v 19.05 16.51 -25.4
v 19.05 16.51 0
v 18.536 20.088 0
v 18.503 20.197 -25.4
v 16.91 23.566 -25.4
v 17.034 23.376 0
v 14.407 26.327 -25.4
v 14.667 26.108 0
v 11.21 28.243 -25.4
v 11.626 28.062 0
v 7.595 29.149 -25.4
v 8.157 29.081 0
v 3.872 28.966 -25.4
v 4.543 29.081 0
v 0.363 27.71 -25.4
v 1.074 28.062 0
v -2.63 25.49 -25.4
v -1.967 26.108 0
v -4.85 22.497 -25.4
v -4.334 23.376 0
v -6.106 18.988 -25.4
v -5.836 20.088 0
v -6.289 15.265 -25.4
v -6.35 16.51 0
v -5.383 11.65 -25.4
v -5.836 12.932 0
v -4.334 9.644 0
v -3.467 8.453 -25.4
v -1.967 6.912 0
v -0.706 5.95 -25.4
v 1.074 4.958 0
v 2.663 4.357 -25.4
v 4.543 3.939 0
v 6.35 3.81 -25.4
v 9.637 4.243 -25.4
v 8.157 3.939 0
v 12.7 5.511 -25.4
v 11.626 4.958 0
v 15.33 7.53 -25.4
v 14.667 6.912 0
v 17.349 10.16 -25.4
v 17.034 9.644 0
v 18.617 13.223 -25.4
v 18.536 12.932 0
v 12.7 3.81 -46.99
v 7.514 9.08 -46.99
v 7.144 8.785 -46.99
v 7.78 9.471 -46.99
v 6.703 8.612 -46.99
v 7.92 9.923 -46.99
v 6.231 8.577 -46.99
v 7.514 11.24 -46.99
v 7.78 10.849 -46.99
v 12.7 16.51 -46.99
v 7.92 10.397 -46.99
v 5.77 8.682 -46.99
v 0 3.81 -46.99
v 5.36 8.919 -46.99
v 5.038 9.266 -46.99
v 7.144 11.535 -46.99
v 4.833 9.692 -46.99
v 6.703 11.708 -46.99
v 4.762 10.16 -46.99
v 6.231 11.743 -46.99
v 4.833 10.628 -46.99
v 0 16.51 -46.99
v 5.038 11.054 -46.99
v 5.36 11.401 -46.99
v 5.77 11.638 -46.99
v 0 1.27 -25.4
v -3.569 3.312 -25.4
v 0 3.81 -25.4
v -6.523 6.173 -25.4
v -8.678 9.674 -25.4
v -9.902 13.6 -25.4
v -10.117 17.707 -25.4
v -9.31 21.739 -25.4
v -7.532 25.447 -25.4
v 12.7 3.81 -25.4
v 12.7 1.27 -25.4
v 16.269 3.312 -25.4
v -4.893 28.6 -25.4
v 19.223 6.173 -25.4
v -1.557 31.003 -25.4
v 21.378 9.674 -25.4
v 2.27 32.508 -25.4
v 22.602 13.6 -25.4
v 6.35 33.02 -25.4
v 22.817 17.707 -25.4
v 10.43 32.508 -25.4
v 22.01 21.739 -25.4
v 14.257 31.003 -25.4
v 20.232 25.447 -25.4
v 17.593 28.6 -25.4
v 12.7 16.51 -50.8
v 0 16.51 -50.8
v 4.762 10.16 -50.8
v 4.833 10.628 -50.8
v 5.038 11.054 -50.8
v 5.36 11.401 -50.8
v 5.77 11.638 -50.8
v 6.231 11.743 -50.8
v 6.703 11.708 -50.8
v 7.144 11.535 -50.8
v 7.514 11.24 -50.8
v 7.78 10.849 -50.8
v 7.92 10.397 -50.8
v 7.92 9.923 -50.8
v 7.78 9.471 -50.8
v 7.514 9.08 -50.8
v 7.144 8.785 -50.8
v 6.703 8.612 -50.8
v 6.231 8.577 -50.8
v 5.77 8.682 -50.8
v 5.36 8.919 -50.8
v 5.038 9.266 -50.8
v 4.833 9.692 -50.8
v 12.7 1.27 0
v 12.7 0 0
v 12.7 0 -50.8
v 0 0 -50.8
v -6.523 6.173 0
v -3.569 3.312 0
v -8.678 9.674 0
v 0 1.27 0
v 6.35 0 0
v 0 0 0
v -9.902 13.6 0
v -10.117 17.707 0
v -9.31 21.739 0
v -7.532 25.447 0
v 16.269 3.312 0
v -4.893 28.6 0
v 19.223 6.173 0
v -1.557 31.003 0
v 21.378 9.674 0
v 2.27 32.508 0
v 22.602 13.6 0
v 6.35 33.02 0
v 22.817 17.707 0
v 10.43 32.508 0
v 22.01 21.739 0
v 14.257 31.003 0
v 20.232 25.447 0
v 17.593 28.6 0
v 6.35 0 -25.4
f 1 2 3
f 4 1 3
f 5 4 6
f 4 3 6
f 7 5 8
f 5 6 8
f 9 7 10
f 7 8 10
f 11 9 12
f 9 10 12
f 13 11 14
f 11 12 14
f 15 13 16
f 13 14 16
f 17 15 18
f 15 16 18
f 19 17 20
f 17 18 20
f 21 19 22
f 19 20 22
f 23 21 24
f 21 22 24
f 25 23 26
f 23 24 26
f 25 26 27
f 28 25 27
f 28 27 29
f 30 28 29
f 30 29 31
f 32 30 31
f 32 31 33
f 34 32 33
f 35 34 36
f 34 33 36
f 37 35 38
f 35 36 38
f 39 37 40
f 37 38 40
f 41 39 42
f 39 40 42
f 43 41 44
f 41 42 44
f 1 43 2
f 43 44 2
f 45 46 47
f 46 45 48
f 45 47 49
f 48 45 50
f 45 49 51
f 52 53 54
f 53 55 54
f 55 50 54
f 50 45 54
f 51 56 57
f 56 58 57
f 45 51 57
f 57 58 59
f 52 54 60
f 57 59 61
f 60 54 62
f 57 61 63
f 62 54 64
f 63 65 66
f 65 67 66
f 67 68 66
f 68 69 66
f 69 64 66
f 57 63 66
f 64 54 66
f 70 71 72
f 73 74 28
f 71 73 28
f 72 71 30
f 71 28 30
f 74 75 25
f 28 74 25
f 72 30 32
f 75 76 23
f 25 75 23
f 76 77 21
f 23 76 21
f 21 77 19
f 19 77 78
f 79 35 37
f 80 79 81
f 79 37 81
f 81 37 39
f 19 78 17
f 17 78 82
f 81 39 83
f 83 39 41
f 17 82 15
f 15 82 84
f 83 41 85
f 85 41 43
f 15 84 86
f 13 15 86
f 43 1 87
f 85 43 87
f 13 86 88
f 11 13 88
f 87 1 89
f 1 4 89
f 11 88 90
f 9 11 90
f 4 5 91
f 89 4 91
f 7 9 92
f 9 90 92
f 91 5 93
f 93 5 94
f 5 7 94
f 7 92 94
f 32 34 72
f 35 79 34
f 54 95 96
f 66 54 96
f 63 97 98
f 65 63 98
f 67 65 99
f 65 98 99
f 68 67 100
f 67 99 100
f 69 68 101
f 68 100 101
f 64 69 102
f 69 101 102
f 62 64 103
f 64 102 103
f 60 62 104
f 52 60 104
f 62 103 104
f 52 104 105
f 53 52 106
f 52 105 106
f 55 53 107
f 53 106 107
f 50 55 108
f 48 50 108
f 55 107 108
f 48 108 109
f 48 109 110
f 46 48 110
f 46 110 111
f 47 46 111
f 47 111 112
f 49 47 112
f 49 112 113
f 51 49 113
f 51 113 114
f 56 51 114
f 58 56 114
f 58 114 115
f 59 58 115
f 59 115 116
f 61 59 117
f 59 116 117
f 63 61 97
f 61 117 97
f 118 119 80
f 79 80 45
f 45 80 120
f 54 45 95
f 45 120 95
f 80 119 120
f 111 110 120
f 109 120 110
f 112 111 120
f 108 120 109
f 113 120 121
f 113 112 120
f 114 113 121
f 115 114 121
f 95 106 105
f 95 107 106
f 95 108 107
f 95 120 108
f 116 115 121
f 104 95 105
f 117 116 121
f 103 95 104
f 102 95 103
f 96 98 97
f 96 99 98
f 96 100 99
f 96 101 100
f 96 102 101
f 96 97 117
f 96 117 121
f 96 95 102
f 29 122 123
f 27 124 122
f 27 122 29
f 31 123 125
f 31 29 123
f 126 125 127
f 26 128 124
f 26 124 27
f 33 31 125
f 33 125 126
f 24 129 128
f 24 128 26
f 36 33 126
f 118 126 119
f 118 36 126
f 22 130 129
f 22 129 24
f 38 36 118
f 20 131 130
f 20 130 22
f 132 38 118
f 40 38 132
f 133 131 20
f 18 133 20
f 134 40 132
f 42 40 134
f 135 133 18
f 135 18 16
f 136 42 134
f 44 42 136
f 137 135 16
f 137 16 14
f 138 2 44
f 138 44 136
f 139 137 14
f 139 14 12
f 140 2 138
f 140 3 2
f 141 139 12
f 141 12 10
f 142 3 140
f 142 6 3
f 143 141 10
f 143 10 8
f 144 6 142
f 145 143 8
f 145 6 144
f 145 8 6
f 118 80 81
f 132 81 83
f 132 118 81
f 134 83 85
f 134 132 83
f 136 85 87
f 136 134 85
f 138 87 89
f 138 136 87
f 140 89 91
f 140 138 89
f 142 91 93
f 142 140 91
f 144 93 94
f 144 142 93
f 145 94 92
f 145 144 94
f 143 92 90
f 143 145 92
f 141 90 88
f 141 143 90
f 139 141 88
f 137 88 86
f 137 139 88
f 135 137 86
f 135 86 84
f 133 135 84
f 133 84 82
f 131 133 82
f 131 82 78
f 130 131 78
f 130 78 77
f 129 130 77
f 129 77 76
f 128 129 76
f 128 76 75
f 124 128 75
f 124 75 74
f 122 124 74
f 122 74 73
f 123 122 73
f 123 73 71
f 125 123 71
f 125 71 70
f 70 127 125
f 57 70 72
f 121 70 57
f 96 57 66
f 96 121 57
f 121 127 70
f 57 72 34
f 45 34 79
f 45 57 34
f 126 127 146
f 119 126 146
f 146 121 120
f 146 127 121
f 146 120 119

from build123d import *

# Parameters (mm, degrees)
SKETCH1_W           = 12.7
SKETCH1_H           = 50.8
BOSS_EXTRUDE1_DEPTH = 3.81
SKETCH2_R           = 16.51
SKETCH2_R_2         = 12.7
BOSS_EXTRUDE2_DEPTH = 25.4
SKETCH3_W           = 12.7
SKETCH3_H           = 12.7
SKETCH3_R           = 1.5875
BOSS_EXTRUDE3_DEPTH = 3.81


with BuildPart() as part:
    # Sketch1 → Boss-Extrude1 (new body)
    with BuildSketch(Plane(origin=(0, 0, 0), x_dir=(1, 0, 0), z_dir=(0, 1, 0))):
        with Locations((6.35, 25.4)):
            Rectangle(SKETCH1_W, SKETCH1_H)
    extrude(amount=BOSS_EXTRUDE1_DEPTH)

    # Sketch2 → Boss-Extrude2 (add)
    with BuildSketch(Plane.XY):
        with Locations((6.35, 16.51)):
            Circle(SKETCH2_R)
        with Locations((6.35, 16.51)):
            Circle(SKETCH2_R_2, mode=Mode.SUBTRACT)
    extrude(amount=-BOSS_EXTRUDE2_DEPTH)

    # Sketch3 → Boss-Extrude3 (add)
    with BuildSketch(Plane(origin=(0, 0, -50.8), x_dir=(-1, 0, 0), z_dir=(0, 0, -1))):
        with Locations((-6.35, 10.16)):
            Rectangle(SKETCH3_W, SKETCH3_H)
        with Locations((-6.35, 10.16)):
            Circle(SKETCH3_R, mode=Mode.SUBTRACT)
    extrude(amount=-BOSS_EXTRUDE3_DEPTH)


solid = part.part
